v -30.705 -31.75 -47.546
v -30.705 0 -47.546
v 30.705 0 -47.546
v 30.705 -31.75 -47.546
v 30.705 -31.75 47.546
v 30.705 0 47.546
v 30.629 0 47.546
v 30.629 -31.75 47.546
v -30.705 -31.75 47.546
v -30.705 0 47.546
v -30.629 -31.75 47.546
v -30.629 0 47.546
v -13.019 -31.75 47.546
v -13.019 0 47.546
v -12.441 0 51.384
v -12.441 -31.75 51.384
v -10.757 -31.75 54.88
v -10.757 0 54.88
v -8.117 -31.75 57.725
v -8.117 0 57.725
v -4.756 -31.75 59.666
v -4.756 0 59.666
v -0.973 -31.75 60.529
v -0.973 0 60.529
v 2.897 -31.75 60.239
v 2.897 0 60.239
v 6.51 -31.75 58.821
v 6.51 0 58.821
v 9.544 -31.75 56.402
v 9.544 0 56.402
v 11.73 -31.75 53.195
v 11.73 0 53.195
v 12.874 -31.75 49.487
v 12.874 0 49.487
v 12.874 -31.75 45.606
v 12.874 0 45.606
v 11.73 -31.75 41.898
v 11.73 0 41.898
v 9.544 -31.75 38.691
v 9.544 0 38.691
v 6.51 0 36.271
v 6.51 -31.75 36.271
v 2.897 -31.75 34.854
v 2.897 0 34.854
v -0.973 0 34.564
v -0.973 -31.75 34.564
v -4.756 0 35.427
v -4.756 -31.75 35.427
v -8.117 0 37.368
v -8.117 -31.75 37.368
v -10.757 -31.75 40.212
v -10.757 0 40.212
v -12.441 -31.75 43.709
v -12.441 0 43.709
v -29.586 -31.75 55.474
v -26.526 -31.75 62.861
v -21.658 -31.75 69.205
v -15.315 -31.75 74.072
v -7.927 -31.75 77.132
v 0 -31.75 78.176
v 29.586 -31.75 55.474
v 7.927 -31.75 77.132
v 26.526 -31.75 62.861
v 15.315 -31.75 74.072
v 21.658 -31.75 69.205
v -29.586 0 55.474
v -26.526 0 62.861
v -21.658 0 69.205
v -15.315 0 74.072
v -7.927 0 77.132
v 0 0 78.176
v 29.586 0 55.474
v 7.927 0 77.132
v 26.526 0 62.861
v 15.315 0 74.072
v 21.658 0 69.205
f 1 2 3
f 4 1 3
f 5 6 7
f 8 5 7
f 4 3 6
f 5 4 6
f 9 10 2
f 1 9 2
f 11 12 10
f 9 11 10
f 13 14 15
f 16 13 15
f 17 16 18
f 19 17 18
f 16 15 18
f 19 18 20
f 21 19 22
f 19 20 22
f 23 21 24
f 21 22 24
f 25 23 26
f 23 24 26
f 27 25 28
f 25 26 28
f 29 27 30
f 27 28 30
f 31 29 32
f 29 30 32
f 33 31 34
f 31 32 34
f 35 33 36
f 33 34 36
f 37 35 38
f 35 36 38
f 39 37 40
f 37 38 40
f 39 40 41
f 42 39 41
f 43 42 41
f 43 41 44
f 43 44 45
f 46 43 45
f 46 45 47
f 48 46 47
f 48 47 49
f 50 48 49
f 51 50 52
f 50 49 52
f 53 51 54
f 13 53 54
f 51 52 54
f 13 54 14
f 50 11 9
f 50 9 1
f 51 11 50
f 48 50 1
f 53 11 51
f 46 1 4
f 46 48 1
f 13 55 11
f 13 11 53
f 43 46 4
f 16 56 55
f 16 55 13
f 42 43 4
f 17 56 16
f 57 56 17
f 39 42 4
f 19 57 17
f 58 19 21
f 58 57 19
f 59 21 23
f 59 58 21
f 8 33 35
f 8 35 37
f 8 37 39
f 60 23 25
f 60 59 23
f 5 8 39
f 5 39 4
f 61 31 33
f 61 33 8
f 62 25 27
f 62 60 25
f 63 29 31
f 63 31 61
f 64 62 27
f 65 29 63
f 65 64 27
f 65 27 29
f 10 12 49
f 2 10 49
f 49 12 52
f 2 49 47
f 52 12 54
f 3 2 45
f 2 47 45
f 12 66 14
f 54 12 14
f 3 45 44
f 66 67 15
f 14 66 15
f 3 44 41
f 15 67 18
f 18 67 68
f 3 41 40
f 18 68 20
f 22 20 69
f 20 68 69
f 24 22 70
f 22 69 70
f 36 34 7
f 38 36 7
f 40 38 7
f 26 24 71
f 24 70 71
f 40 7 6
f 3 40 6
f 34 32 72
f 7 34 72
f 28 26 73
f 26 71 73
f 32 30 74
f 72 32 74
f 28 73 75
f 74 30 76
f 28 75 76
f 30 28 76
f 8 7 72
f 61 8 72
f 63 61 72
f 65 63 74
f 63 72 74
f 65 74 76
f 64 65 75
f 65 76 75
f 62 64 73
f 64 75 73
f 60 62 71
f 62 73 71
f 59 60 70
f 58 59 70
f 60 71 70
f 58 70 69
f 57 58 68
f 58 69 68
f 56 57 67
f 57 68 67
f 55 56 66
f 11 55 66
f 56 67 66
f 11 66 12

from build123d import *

# Parameters (mm, degrees)
F1_DEPTH = 31.75


with BuildPart() as f1:
    # F0 (on Front) → F1 (new body)
    with BuildSketch(Plane.XZ):
        with BuildLine():
            Line((-30.705059, -47.546379), (30.705059, -47.546379))
            Line((30.705059, -47.546379), (30.705059, 47.546379))
            Line((30.705059, 47.546379), (30.629403, 47.546379))
            Line((30.629403, 47.546379), (13.019142, 47.546379))
            ThreePointArc((13.019142, 47.546379), (0, 34.527237), (-13.019142, 47.546379))
            Line((-13.019142, 47.546379), (-30.629403, 47.546379))
            Line((-30.629403, 47.546379), (-30.705059, 47.546379))
            Line((-30.705059, 47.546379), (-30.705059, -47.546379))
        make_face()
        with BuildLine():
            Line((13.019142, 47.546379), (30.629403, 47.546379))
            ThreePointArc((30.629403, 47.546379), (0, 78.175783), (-30.629403, 47.546379))
            Line((-30.629403, 47.546379), (-13.019142, 47.546379))
            ThreePointArc((-13.019142, 47.546379), (0, 60.565521), (13.019142, 47.546379))
        make_face()
    extrude(amount=F1_DEPTH)


solid = f1.part
